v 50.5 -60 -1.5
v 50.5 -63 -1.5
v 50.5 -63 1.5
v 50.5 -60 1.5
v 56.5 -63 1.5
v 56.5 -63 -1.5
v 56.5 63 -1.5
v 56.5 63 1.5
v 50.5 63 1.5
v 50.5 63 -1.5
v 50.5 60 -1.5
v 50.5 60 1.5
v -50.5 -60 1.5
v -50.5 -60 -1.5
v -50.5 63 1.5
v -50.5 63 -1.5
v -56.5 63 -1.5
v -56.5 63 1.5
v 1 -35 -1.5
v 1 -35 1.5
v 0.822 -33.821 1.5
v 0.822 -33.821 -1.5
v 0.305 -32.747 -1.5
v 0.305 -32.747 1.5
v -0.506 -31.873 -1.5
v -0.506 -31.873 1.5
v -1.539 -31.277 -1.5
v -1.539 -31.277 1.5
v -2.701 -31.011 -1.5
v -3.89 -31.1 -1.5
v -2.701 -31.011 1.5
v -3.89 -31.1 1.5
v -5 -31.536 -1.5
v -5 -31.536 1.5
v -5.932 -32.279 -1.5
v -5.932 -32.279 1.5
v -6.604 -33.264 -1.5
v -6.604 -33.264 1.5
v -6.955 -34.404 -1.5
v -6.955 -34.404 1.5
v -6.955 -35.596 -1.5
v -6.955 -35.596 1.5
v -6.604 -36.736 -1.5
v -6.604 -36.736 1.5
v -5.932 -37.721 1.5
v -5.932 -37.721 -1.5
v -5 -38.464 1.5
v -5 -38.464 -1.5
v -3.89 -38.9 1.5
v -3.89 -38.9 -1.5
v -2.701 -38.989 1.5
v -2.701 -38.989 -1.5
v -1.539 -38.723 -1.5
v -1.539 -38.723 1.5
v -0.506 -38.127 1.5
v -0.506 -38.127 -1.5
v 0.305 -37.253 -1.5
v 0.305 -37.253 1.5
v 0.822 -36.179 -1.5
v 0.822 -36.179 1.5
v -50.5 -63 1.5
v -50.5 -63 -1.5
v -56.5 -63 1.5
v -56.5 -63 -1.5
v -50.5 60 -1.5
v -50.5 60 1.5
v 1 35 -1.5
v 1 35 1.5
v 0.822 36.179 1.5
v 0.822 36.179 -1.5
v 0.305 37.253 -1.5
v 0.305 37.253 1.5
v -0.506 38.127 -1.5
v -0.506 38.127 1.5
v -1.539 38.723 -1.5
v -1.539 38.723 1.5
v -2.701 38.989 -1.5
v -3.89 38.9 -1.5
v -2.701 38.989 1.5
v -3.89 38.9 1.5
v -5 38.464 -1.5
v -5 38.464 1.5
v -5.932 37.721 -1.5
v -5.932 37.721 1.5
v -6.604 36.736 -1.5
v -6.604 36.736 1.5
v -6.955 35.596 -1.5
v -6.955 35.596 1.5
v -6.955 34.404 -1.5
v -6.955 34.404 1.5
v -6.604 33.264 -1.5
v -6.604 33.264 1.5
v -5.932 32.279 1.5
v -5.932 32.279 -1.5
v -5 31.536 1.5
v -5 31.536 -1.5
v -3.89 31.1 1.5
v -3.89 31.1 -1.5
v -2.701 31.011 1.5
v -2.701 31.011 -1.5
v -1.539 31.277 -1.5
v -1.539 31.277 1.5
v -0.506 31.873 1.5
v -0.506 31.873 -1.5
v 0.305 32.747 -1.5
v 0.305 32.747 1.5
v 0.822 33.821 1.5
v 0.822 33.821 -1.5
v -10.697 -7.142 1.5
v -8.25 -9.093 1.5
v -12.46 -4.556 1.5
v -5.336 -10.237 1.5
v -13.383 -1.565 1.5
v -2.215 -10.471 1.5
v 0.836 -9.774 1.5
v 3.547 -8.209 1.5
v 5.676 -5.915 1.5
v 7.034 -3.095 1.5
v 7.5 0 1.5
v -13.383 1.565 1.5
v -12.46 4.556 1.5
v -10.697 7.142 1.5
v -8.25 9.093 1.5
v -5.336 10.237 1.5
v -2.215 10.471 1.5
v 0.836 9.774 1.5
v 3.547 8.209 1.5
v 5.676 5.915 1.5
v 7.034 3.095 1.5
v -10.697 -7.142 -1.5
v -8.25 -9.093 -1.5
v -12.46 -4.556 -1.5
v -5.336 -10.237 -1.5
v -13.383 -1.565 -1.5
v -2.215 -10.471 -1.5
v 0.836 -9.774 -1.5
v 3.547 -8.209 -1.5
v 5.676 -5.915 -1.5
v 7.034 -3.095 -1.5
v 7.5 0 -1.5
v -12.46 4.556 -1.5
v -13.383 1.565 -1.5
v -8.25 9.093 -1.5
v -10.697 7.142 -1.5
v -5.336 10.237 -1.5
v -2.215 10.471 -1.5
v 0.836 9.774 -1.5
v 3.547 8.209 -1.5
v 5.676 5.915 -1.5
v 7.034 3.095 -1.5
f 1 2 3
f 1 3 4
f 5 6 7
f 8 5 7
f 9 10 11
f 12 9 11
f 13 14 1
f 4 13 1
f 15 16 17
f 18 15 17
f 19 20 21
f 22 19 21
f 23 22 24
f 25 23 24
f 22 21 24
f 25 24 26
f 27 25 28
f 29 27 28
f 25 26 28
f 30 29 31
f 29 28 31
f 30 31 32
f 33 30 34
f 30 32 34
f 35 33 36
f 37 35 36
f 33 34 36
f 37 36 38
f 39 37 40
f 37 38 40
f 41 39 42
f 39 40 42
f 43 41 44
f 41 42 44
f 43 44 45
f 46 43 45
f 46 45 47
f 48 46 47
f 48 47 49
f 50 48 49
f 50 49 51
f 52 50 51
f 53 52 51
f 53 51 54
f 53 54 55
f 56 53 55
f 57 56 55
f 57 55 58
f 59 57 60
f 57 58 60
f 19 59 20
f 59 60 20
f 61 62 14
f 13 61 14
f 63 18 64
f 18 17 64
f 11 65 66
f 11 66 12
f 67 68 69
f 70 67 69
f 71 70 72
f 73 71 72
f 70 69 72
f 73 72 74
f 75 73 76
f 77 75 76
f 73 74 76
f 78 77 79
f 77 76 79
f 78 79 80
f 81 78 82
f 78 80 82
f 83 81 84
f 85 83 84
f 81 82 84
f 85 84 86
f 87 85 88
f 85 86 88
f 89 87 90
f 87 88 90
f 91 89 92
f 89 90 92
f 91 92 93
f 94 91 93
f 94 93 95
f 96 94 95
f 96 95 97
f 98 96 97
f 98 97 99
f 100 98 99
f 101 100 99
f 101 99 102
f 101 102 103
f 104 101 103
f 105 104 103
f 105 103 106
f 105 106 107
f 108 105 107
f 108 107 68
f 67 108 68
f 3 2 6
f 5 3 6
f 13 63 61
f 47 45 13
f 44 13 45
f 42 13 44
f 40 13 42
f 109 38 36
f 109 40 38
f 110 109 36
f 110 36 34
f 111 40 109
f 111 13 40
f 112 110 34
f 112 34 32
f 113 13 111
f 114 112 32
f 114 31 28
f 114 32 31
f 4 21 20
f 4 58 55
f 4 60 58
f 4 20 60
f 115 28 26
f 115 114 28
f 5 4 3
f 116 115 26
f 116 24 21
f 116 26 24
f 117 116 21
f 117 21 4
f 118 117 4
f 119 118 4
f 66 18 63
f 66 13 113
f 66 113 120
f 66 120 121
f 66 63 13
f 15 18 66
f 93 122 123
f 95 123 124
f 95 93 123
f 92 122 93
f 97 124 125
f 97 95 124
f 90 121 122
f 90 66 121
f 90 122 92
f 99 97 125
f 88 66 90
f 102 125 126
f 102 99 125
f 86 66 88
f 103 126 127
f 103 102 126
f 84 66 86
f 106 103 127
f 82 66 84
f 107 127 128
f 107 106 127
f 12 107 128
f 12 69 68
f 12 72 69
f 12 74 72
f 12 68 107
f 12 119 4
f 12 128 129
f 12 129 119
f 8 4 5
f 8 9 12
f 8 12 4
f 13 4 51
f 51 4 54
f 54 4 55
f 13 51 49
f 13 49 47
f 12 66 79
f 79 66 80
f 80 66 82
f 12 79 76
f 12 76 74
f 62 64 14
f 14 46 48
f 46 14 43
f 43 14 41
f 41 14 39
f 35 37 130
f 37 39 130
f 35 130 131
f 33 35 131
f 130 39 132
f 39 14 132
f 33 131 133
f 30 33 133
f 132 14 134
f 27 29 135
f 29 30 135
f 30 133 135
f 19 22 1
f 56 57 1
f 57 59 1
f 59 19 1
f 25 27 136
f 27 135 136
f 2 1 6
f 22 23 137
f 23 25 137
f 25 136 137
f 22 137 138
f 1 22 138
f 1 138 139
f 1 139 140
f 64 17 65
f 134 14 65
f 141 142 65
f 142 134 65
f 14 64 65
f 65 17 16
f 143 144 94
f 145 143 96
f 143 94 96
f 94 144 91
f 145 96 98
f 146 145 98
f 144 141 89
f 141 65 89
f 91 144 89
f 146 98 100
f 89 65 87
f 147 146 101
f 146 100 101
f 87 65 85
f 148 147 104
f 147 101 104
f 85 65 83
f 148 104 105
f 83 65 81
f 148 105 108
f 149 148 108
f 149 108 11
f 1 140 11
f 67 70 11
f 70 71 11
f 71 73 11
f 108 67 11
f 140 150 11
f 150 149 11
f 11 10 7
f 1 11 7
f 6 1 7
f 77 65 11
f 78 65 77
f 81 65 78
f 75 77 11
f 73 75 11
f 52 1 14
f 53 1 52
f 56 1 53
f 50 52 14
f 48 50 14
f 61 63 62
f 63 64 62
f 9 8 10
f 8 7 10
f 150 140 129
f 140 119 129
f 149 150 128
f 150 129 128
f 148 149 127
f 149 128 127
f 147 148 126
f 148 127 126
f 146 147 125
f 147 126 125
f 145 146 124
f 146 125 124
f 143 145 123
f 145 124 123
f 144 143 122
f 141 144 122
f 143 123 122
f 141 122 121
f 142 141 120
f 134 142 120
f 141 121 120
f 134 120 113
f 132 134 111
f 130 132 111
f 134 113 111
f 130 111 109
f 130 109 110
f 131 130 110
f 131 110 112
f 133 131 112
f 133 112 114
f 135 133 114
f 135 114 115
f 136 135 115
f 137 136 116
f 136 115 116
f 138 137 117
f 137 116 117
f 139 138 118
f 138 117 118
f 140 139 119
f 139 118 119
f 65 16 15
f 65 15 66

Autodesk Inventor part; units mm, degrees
ref_plane "YZ Plane" through (0, 0, 0) normal (1, 0, 0) x (0, 1, 0)
ref_plane "XZ Plane" through (0, 0, 0) normal (0, 1, 0) x (-1, 0, 0)
ref_plane "XY Plane" through (0, 0, 0) normal (0, 0, 1) x (1, 0, 0)
sketch "Sketch1" plane through (0, 0, 0) normal (0, 0, 1) x (1, 0, 0)
  line L0 (-56.5, -63) -> (56.5, -63)
  line L1 (56.5, -63) -> (56.5, 63)
  line L2 (56.5, 63) -> (-56.5, 63)
  line L3 (-56.5, 63) -> (-56.5, -63)
  line L4 (-56.5, -63) -> (56.5, 63) construction
  line L5 (56.5, -63) -> (-56.5, 63) construction
  line L6 (56.5, -63) -> (50.5, -63)
  line L7 (50.5, -63) -> (50.5, -60)
  line L8 (50.5, -60) -> (56.5, -60)
  line L9 (56.5, -60) -> (56.5, -63)
  line L10 (0, 63) -> (0, -63)
  line L11 (-56.5, 0) -> (56.5, 0)
  line L12 (-56.5, -63) -> (-50.5, -63)
  line L13 (-50.5, -63) -> (-50.5, -60)
  line L14 (-50.5, -60) -> (-56.5, -60)
  line L15 (-56.5, -60) -> (-56.5, -63)
  line L16 (50.5, 63) -> (50.5, 60)
  line L17 (50.5, 60) -> (56.5, 60)
  line L18 (-50.5, 63) -> (-50.5, 60)
  line L19 (-50.5, 60) -> (-56.5, 60)
  line L20 (-50.5, -60) -> (50.5, -60)
  line L21 (-50.5, 60) -> (50.5, 60)
  point P0 (0, 0)
  point P1 (-50.5, -63)
  point P2 (50.5, -63)
  point P3 (50.5, 63)
  point P4 (-50.5, 63)
  dimension "d0" = 113
  dimension "d1" = 126
  dimension "d2" = 6
  dimension "d3" = 3
extrude "Extrusion1" add sketch "Sketch1" along normal mid plane 3 contours L3 L14 L13 L0 | L3 L11 L10 L20 L14 | L3 L19 L21 L10 L11 | L7 L8 L1 L0 | L10 L11 L1 L8 L20 | L3 L2 L18 L19 | L10 L21 L17 L1 L11 | L16 L2 L1 L17
sketch "Sketch2" plane through (0, 0, 1.5) normal (0, 0, 1) x (1, 0, 0)
  circle A0 centre (-3, -35) radius 4
  line L0 (-3, 0) -> (-56.5, 0)
  line L1 (-56.5, 63) -> (-56.5, -63) projected
  circle A1 centre (-3, 35) radius 4
  circle A2 centre (-3, 0) radius 10.5
  line L2 (56.5, -63) -> (56.5, 63) projected
  line L3 (50.5, 60) -> (-50.5, 60) projected
  dimension "d6" = 70
  dimension "d7" = 8
  dimension "d8" = 21
  dimension "d11" = 59.5
  dimension "d12" = 60
extrude "Extrusion2" cut sketch "Sketch2" against normal blind 3
properties part number "upper support"
